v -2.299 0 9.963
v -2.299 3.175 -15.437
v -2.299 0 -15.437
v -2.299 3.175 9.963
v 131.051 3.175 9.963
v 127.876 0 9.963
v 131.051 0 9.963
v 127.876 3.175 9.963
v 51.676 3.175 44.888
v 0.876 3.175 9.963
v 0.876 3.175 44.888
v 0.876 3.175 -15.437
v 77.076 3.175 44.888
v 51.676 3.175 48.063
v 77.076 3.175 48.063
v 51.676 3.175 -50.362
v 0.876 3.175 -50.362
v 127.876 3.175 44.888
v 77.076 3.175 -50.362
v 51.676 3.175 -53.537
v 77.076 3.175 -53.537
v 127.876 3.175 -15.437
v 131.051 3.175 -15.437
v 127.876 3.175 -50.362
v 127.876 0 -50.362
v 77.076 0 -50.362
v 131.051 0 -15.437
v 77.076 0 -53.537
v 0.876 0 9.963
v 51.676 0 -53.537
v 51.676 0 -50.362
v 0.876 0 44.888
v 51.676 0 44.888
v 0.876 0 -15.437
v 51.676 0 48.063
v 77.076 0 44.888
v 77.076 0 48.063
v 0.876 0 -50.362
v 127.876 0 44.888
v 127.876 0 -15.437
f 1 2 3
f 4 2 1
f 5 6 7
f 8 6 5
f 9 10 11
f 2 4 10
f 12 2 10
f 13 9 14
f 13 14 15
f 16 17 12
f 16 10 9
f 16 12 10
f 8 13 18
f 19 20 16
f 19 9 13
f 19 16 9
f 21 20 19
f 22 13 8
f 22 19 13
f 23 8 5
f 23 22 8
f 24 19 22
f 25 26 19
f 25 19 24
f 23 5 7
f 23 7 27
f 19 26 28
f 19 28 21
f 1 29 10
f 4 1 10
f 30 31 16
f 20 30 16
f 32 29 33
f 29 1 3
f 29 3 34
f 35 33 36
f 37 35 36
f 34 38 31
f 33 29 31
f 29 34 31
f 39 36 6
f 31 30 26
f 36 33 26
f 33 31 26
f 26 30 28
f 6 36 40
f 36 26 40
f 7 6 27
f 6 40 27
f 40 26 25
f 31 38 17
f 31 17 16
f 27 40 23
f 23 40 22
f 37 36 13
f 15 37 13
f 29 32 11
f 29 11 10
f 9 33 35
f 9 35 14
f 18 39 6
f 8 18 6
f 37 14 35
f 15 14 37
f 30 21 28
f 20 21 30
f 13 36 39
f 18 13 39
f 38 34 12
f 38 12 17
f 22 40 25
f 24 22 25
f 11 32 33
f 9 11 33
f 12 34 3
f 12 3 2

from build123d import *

# Parameters (mm, degrees)
SKETCH1_W           = 127
SKETCH1_H           = 95.25
BOSS_EXTRUDE1_DEPTH = 3.175
SKETCH2_W           = 25.4
SKETCH2_H           = 3.175
BOSS_EXTRUDE2_DEPTH = 3.175
SKETCH3_W           = 25.4
SKETCH3_H           = 3.175
BOSS_EXTRUDE3_DEPTH = 3.175
SKETCH4_W           = 25.4
SKETCH4_H           = 3.175
BOSS_EXTRUDE4_DEPTH = 3.175
SKETCH5_W           = 25.4
SKETCH5_H           = 3.175
BOSS_EXTRUDE5_DEPTH = 3.175


with BuildPart() as part:
    # Sketch1 → Boss-Extrude1 (new body)
    with BuildSketch(Plane(origin=(0, 0, 0), x_dir=(1, 0, 0), z_dir=(0, 1, 0))):
        with Locations((64.375862069, 2.737068966)):
            Rectangle(SKETCH1_W, SKETCH1_H)
    extrude(amount=BOSS_EXTRUDE1_DEPTH)

    # Sketch2 → Boss-Extrude2 (add)
    with BuildSketch(Plane(origin=(127.875862069, 0, 0), x_dir=(0, 0, -1), z_dir=(1, 0, 0))):
        with Locations((2.737068966, 1.5875)):
            Rectangle(SKETCH2_W, SKETCH2_H)
    extrude(amount=BOSS_EXTRUDE2_DEPTH)

    # Sketch3 → Boss-Extrude3 (add)
    with BuildSketch(Plane.ZY.offset(-0.875862069)):
        with Locations((-2.737068966, 1.5875)):
            Rectangle(SKETCH3_W, SKETCH3_H)
    extrude(amount=BOSS_EXTRUDE3_DEPTH)

    # Sketch4 → Boss-Extrude4 (add)
    with BuildSketch(Plane(origin=(0, 0, -50.362068966), x_dir=(-1, 0, 0), z_dir=(0, 0, -1))):
        with Locations((-64.375862069, 1.5875)):
            Rectangle(SKETCH4_W, SKETCH4_H)
    extrude(amount=BOSS_EXTRUDE4_DEPTH)

    # Sketch5 → Boss-Extrude5 (add)
    with BuildSketch(Plane.XY.offset(44.887931034)):
        with Locations((64.375862069, 1.5875)):
            Rectangle(SKETCH5_W, SKETCH5_H)
    extrude(amount=BOSS_EXTRUDE5_DEPTH)


solid = part.part
